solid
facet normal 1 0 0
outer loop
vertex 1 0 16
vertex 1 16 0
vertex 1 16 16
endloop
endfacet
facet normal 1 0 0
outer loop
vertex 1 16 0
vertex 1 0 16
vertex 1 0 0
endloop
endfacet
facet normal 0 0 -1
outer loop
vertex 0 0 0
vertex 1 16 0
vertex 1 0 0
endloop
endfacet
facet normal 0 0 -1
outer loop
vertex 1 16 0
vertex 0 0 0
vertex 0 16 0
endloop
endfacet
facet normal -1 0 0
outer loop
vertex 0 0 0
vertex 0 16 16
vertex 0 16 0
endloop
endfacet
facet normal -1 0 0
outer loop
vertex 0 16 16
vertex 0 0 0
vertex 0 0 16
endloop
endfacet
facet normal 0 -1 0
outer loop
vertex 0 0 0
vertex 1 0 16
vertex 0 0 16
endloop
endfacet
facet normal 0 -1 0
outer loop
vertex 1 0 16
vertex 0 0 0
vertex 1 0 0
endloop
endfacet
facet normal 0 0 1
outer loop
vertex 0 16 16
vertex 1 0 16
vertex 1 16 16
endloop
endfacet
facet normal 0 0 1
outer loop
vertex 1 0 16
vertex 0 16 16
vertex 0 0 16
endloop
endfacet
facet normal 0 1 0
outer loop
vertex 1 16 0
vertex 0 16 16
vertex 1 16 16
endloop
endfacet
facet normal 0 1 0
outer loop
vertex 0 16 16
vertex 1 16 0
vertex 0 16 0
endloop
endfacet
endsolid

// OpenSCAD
union() {
    translate([0, 0, 0]) cube([1, 1, 1]);
    translate([0, 0, 1]) cube([1, 1, 1]);
    translate([0, 0, 2]) cube([1, 1, 1]);
    translate([0, 0, 3]) cube([1, 1, 1]);
    translate([0, 0, 4]) cube([1, 1, 1]);
    translate([0, 0, 5]) cube([1, 1, 1]);
    translate([0, 0, 6]) cube([1, 1, 1]);
    translate([0, 0, 7]) cube([1, 1, 1]);
    translate([0, 0, 8]) cube([1, 1, 1]);
    translate([0, 0, 9]) cube([1, 1, 1]);
    translate([0, 0, 10]) cube([1, 1, 1]);
    translate([0, 0, 11]) cube([1, 1, 1]);
    translate([0, 0, 12]) cube([1, 1, 1]);
    translate([0, 0, 13]) cube([1, 1, 1]);
    translate([0, 0, 14]) cube([1, 1, 1]);
    translate([0, 0, 15]) cube([1, 1, 1]);
    translate([0, 1, 0]) cube([1, 1, 1]);
    translate([0, 1, 1]) cube([1, 1, 1]);
    translate([0, 1, 2]) cube([1, 1, 1]);
    translate([0, 1, 3]) cube([1, 1, 1]);
    translate([0, 1, 4]) cube([1, 1, 1]);
    translate([0, 1, 5]) cube([1, 1, 1]);
    translate([0, 1, 6]) cube([1, 1, 1]);
    translate([0, 1, 7]) cube([1, 1, 1]);
    translate([0, 1, 8]) cube([1, 1, 1]);
    translate([0, 1, 9]) cube([1, 1, 1]);
    translate([0, 1, 10]) cube([1, 1, 1]);
    translate([0, 1, 11]) cube([1, 1, 1]);
    translate([0, 1, 12]) cube([1, 1, 1]);
    translate([0, 1, 13]) cube([1, 1, 1]);
    translate([0, 1, 14]) cube([1, 1, 1]);
    translate([0, 1, 15]) cube([1, 1, 1]);
    translate([0, 2, 0]) cube([1, 1, 1]);
    translate([0, 2, 1]) cube([1, 1, 1]);
    translate([0, 2, 2]) cube([1, 1, 1]);
    translate([0, 2, 3]) cube([1, 1, 1]);
    translate([0, 2, 4]) cube([1, 1, 1]);
    translate([0, 2, 5]) cube([1, 1, 1]);
    translate([0, 2, 6]) cube([1, 1, 1]);
    translate([0, 2, 7]) cube([1, 1, 1]);
    translate([0, 2, 8]) cube([1, 1, 1]);
    translate([0, 2, 9]) cube([1, 1, 1]);
    translate([0, 2, 10]) cube([1, 1, 1]);
    translate([0, 2, 11]) cube([1, 1, 1]);
    translate([0, 2, 12]) cube([1, 1, 1]);
    translate([0, 2, 13]) cube([1, 1, 1]);
    translate([0, 2, 14]) cube([1, 1, 1]);
    translate([0, 2, 15]) cube([1, 1, 1]);
    translate([0, 3, 0]) cube([1, 1, 1]);
    translate([0, 3, 1]) cube([1, 1, 1]);
    translate([0, 3, 2]) cube([1, 1, 1]);
    translate([0, 3, 3]) cube([1, 1, 1]);
    translate([0, 3, 4]) cube([1, 1, 1]);
    translate([0, 3, 5]) cube([1, 1, 1]);
    translate([0, 3, 6]) cube([1, 1, 1]);
    translate([0, 3, 7]) cube([1, 1, 1]);
    translate([0, 3, 8]) cube([1, 1, 1]);
    translate([0, 3, 9]) cube([1, 1, 1]);
    translate([0, 3, 10]) cube([1, 1, 1]);
    translate([0, 3, 11]) cube([1, 1, 1]);
    translate([0, 3, 12]) cube([1, 1, 1]);
    translate([0, 3, 13]) cube([1, 1, 1]);
    translate([0, 3, 14]) cube([1, 1, 1]);
    translate([0, 3, 15]) cube([1, 1, 1]);
    translate([0, 4, 0]) cube([1, 1, 1]);
    translate([0, 4, 1]) cube([1, 1, 1]);
    translate([0, 4, 2]) cube([1, 1, 1]);
    translate([0, 4, 3]) cube([1, 1, 1]);
    translate([0, 4, 4]) cube([1, 1, 1]);
    translate([0, 4, 5]) cube([1, 1, 1]);
    translate([0, 4, 6]) cube([1, 1, 1]);
    translate([0, 4, 7]) cube([1, 1, 1]);
    translate([0, 4, 8]) cube([1, 1, 1]);
    translate([0, 4, 9]) cube([1, 1, 1]);
    translate([0, 4, 10]) cube([1, 1, 1]);
    translate([0, 4, 11]) cube([1, 1, 1]);
    translate([0, 4, 12]) cube([1, 1, 1]);
    translate([0, 4, 13]) cube([1, 1, 1]);
    translate([0, 4, 14]) cube([1, 1, 1]);
    translate([0, 4, 15]) cube([1, 1, 1]);
    translate([0, 5, 0]) cube([1, 1, 1]);
    translate([0, 5, 1]) cube([1, 1, 1]);
    translate([0, 5, 2]) cube([1, 1, 1]);
    translate([0, 5, 3]) cube([1, 1, 1]);
    translate([0, 5, 4]) cube([1, 1, 1]);
    translate([0, 5, 5]) cube([1, 1, 1]);
    translate([0, 5, 6]) cube([1, 1, 1]);
    translate([0, 5, 7]) cube([1, 1, 1]);
    translate([0, 5, 8]) cube([1, 1, 1]);
    translate([0, 5, 9]) cube([1, 1, 1]);
    translate([0, 5, 10]) cube([1, 1, 1]);
    translate([0, 5, 11]) cube([1, 1, 1]);
    translate([0, 5, 12]) cube([1, 1, 1]);
    translate([0, 5, 13]) cube([1, 1, 1]);
    translate([0, 5, 14]) cube([1, 1, 1]);
    translate([0, 5, 15]) cube([1, 1, 1]);
    translate([0, 6, 0]) cube([1, 1, 1]);
    translate([0, 6, 1]) cube([1, 1, 1]);
    translate([0, 6, 2]) cube([1, 1, 1]);
    translate([0, 6, 3]) cube([1, 1, 1]);
    translate([0, 6, 4]) cube([1, 1, 1]);
    translate([0, 6, 5]) cube([1, 1, 1]);
    translate([0, 6, 6]) cube([1, 1, 1]);
    translate([0, 6, 7]) cube([1, 1, 1]);
    translate([0, 6, 8]) cube([1, 1, 1]);
    translate([0, 6, 9]) cube([1, 1, 1]);
    translate([0, 6, 10]) cube([1, 1, 1]);
    translate([0, 6, 11]) cube([1, 1, 1]);
    translate([0, 6, 12]) cube([1, 1, 1]);
    translate([0, 6, 13]) cube([1, 1, 1]);
    translate([0, 6, 14]) cube([1, 1, 1]);
    translate([0, 6, 15]) cube([1, 1, 1]);
    translate([0, 7, 0]) cube([1, 1, 1]);
    translate([0, 7, 1]) cube([1, 1, 1]);
    translate([0, 7, 2]) cube([1, 1, 1]);
    translate([0, 7, 3]) cube([1, 1, 1]);
    translate([0, 7, 4]) cube([1, 1, 1]);
    translate([0, 7, 5]) cube([1, 1, 1]);
    translate([0, 7, 6]) cube([1, 1, 1]);
    translate([0, 7, 7]) cube([1, 1, 1]);
    translate([0, 7, 8]) cube([1, 1, 1]);
    translate([0, 7, 9]) cube([1, 1, 1]);
    translate([0, 7, 10]) cube([1, 1, 1]);
    translate([0, 7, 11]) cube([1, 1, 1]);
    translate([0, 7, 12]) cube([1, 1, 1]);
    translate([0, 7, 13]) cube([1, 1, 1]);
    translate([0, 7, 14]) cube([1, 1, 1]);
    translate([0, 7, 15]) cube([1, 1, 1]);
    translate([0, 8, 0]) cube([1, 1, 1]);
    translate([0, 8, 1]) cube([1, 1, 1]);
    translate([0, 8, 2]) cube([1, 1, 1]);
    translate([0, 8, 3]) cube([1, 1, 1]);
    translate([0, 8, 4]) cube([1, 1, 1]);
    translate([0, 8, 5]) cube([1, 1, 1]);
    translate([0, 8, 6]) cube([1, 1, 1]);
    translate([0, 8, 7]) cube([1, 1, 1]);
    translate([0, 8, 8]) cube([1, 1, 1]);
    translate([0, 8, 9]) cube([1, 1, 1]);
    translate([0, 8, 10]) cube([1, 1, 1]);
    translate([0, 8, 11]) cube([1, 1, 1]);
    translate([0, 8, 12]) cube([1, 1, 1]);
    translate([0, 8, 13]) cube([1, 1, 1]);
    translate([0, 8, 14]) cube([1, 1, 1]);
    translate([0, 8, 15]) cube([1, 1, 1]);
    translate([0, 9, 0]) cube([1, 1, 1]);
    translate([0, 9, 1]) cube([1, 1, 1]);
    translate([0, 9, 2]) cube([1, 1, 1]);
    translate([0, 9, 3]) cube([1, 1, 1]);
    translate([0, 9, 4]) cube([1, 1, 1]);
    translate([0, 9, 5]) cube([1, 1, 1]);
    translate([0, 9, 6]) cube([1, 1, 1]);
    translate([0, 9, 7]) cube([1, 1, 1]);
    translate([0, 9, 8]) cube([1, 1, 1]);
    translate([0, 9, 9]) cube([1, 1, 1]);
    translate([0, 9, 10]) cube([1, 1, 1]);
    translate([0, 9, 11]) cube([1, 1, 1]);
    translate([0, 9, 12]) cube([1, 1, 1]);
    translate([0, 9, 13]) cube([1, 1, 1]);
    translate([0, 9, 14]) cube([1, 1, 1]);
    translate([0, 9, 15]) cube([1, 1, 1]);
    translate([0, 10, 0]) cube([1, 1, 1]);
    translate([0, 10, 1]) cube([1, 1, 1]);
    translate([0, 10, 2]) cube([1, 1, 1]);
    translate([0, 10, 3]) cube([1, 1, 1]);
    translate([0, 10, 4]) cube([1, 1, 1]);
    translate([0, 10, 5]) cube([1, 1, 1]);
    translate([0, 10, 6]) cube([1, 1, 1]);
    translate([0, 10, 7]) cube([1, 1, 1]);
    translate([0, 10, 8]) cube([1, 1, 1]);
    translate([0, 10, 9]) cube([1, 1, 1]);
    translate([0, 10, 10]) cube([1, 1, 1]);
    translate([0, 10, 11]) cube([1, 1, 1]);
    translate([0, 10, 12]) cube([1, 1, 1]);
    translate([0, 10, 13]) cube([1, 1, 1]);
    translate([0, 10, 14]) cube([1, 1, 1]);
    translate([0, 10, 15]) cube([1, 1, 1]);
    translate([0, 11, 0]) cube([1, 1, 1]);
    translate([0, 11, 1]) cube([1, 1, 1]);
    translate([0, 11, 2]) cube([1, 1, 1]);
    translate([0, 11, 3]) cube([1, 1, 1]);
    translate([0, 11, 4]) cube([1, 1, 1]);
    translate([0, 11, 5]) cube([1, 1, 1]);
    translate([0, 11, 6]) cube([1, 1, 1]);
    translate([0, 11, 7]) cube([1, 1, 1]);
    translate([0, 11, 8]) cube([1, 1, 1]);
    translate([0, 11, 9]) cube([1, 1, 1]);
    translate([0, 11, 10]) cube([1, 1, 1]);
    translate([0, 11, 11]) cube([1, 1, 1]);
    translate([0, 11, 12]) cube([1, 1, 1]);
    translate([0, 11, 13]) cube([1, 1, 1]);
    translate([0, 11, 14]) cube([1, 1, 1]);
    translate([0, 11, 15]) cube([1, 1, 1]);
    translate([0, 12, 0]) cube([1, 1, 1]);
    translate([0, 12, 1]) cube([1, 1, 1]);
    translate([0, 12, 2]) cube([1, 1, 1]);
    translate([0, 12, 3]) cube([1, 1, 1]);
    translate([0, 12, 4]) cube([1, 1, 1]);
    translate([0, 12, 5]) cube([1, 1, 1]);
    translate([0, 12, 6]) cube([1, 1, 1]);
    translate([0, 12, 7]) cube([1, 1, 1]);
    translate([0, 12, 8]) cube([1, 1, 1]);
    translate([0, 12, 9]) cube([1, 1, 1]);
    translate([0, 12, 10]) cube([1, 1, 1]);
    translate([0, 12, 11]) cube([1, 1, 1]);
    translate([0, 12, 12]) cube([1, 1, 1]);
    translate([0, 12, 13]) cube([1, 1, 1]);
    translate([0, 12, 14]) cube([1, 1, 1]);
    translate([0, 12, 15]) cube([1, 1, 1]);
    translate([0, 13, 0]) cube([1, 1, 1]);
    translate([0, 13, 1]) cube([1, 1, 1]);
    translate([0, 13, 2]) cube([1, 1, 1]);
    translate([0, 13, 3]) cube([1, 1, 1]);
    translate([0, 13, 4]) cube([1, 1, 1]);
    translate([0, 13, 5]) cube([1, 1, 1]);
    translate([0, 13, 6]) cube([1, 1, 1]);
    translate([0, 13, 7]) cube([1, 1, 1]);
    translate([0, 13, 8]) cube([1, 1, 1]);
    translate([0, 13, 9]) cube([1, 1, 1]);
    translate([0, 13, 10]) cube([1, 1, 1]);
    translate([0, 13, 11]) cube([1, 1, 1]);
    translate([0, 13, 12]) cube([1, 1, 1]);
    translate([0, 13, 13]) cube([1, 1, 1]);
    translate([0, 13, 14]) cube([1, 1, 1]);
    translate([0, 13, 15]) cube([1, 1, 1]);
    translate([0, 14, 0]) cube([1, 1, 1]);
    translate([0, 14, 1]) cube([1, 1, 1]);
    translate([0, 14, 2]) cube([1, 1, 1]);
    translate([0, 14, 3]) cube([1, 1, 1]);
    translate([0, 14, 4]) cube([1, 1, 1]);
    translate([0, 14, 5]) cube([1, 1, 1]);
    translate([0, 14, 6]) cube([1, 1, 1]);
    translate([0, 14, 7]) cube([1, 1, 1]);
    translate([0, 14, 8]) cube([1, 1, 1]);
    translate([0, 14, 9]) cube([1, 1, 1]);
    translate([0, 14, 10]) cube([1, 1, 1]);
    translate([0, 14, 11]) cube([1, 1, 1]);
    translate([0, 14, 12]) cube([1, 1, 1]);
    translate([0, 14, 13]) cube([1, 1, 1]);
    translate([0, 14, 14]) cube([1, 1, 1]);
    translate([0, 14, 15]) cube([1, 1, 1]);
    translate([0, 15, 0]) cube([1, 1, 1]);
    translate([0, 15, 1]) cube([1, 1, 1]);
    translate([0, 15, 2]) cube([1, 1, 1]);
    translate([0, 15, 3]) cube([1, 1, 1]);
    translate([0, 15, 4]) cube([1, 1, 1]);
    translate([0, 15, 5]) cube([1, 1, 1]);
    translate([0, 15, 6]) cube([1, 1, 1]);
    translate([0, 15, 7]) cube([1, 1, 1]);
    translate([0, 15, 8]) cube([1, 1, 1]);
    translate([0, 15, 9]) cube([1, 1, 1]);
    translate([0, 15, 10]) cube([1, 1, 1]);
    translate([0, 15, 11]) cube([1, 1, 1]);
    translate([0, 15, 12]) cube([1, 1, 1]);
    translate([0, 15, 13]) cube([1, 1, 1]);
    translate([0, 15, 14]) cube([1, 1, 1]);
    translate([0, 15, 15]) cube([1, 1, 1]);
}
